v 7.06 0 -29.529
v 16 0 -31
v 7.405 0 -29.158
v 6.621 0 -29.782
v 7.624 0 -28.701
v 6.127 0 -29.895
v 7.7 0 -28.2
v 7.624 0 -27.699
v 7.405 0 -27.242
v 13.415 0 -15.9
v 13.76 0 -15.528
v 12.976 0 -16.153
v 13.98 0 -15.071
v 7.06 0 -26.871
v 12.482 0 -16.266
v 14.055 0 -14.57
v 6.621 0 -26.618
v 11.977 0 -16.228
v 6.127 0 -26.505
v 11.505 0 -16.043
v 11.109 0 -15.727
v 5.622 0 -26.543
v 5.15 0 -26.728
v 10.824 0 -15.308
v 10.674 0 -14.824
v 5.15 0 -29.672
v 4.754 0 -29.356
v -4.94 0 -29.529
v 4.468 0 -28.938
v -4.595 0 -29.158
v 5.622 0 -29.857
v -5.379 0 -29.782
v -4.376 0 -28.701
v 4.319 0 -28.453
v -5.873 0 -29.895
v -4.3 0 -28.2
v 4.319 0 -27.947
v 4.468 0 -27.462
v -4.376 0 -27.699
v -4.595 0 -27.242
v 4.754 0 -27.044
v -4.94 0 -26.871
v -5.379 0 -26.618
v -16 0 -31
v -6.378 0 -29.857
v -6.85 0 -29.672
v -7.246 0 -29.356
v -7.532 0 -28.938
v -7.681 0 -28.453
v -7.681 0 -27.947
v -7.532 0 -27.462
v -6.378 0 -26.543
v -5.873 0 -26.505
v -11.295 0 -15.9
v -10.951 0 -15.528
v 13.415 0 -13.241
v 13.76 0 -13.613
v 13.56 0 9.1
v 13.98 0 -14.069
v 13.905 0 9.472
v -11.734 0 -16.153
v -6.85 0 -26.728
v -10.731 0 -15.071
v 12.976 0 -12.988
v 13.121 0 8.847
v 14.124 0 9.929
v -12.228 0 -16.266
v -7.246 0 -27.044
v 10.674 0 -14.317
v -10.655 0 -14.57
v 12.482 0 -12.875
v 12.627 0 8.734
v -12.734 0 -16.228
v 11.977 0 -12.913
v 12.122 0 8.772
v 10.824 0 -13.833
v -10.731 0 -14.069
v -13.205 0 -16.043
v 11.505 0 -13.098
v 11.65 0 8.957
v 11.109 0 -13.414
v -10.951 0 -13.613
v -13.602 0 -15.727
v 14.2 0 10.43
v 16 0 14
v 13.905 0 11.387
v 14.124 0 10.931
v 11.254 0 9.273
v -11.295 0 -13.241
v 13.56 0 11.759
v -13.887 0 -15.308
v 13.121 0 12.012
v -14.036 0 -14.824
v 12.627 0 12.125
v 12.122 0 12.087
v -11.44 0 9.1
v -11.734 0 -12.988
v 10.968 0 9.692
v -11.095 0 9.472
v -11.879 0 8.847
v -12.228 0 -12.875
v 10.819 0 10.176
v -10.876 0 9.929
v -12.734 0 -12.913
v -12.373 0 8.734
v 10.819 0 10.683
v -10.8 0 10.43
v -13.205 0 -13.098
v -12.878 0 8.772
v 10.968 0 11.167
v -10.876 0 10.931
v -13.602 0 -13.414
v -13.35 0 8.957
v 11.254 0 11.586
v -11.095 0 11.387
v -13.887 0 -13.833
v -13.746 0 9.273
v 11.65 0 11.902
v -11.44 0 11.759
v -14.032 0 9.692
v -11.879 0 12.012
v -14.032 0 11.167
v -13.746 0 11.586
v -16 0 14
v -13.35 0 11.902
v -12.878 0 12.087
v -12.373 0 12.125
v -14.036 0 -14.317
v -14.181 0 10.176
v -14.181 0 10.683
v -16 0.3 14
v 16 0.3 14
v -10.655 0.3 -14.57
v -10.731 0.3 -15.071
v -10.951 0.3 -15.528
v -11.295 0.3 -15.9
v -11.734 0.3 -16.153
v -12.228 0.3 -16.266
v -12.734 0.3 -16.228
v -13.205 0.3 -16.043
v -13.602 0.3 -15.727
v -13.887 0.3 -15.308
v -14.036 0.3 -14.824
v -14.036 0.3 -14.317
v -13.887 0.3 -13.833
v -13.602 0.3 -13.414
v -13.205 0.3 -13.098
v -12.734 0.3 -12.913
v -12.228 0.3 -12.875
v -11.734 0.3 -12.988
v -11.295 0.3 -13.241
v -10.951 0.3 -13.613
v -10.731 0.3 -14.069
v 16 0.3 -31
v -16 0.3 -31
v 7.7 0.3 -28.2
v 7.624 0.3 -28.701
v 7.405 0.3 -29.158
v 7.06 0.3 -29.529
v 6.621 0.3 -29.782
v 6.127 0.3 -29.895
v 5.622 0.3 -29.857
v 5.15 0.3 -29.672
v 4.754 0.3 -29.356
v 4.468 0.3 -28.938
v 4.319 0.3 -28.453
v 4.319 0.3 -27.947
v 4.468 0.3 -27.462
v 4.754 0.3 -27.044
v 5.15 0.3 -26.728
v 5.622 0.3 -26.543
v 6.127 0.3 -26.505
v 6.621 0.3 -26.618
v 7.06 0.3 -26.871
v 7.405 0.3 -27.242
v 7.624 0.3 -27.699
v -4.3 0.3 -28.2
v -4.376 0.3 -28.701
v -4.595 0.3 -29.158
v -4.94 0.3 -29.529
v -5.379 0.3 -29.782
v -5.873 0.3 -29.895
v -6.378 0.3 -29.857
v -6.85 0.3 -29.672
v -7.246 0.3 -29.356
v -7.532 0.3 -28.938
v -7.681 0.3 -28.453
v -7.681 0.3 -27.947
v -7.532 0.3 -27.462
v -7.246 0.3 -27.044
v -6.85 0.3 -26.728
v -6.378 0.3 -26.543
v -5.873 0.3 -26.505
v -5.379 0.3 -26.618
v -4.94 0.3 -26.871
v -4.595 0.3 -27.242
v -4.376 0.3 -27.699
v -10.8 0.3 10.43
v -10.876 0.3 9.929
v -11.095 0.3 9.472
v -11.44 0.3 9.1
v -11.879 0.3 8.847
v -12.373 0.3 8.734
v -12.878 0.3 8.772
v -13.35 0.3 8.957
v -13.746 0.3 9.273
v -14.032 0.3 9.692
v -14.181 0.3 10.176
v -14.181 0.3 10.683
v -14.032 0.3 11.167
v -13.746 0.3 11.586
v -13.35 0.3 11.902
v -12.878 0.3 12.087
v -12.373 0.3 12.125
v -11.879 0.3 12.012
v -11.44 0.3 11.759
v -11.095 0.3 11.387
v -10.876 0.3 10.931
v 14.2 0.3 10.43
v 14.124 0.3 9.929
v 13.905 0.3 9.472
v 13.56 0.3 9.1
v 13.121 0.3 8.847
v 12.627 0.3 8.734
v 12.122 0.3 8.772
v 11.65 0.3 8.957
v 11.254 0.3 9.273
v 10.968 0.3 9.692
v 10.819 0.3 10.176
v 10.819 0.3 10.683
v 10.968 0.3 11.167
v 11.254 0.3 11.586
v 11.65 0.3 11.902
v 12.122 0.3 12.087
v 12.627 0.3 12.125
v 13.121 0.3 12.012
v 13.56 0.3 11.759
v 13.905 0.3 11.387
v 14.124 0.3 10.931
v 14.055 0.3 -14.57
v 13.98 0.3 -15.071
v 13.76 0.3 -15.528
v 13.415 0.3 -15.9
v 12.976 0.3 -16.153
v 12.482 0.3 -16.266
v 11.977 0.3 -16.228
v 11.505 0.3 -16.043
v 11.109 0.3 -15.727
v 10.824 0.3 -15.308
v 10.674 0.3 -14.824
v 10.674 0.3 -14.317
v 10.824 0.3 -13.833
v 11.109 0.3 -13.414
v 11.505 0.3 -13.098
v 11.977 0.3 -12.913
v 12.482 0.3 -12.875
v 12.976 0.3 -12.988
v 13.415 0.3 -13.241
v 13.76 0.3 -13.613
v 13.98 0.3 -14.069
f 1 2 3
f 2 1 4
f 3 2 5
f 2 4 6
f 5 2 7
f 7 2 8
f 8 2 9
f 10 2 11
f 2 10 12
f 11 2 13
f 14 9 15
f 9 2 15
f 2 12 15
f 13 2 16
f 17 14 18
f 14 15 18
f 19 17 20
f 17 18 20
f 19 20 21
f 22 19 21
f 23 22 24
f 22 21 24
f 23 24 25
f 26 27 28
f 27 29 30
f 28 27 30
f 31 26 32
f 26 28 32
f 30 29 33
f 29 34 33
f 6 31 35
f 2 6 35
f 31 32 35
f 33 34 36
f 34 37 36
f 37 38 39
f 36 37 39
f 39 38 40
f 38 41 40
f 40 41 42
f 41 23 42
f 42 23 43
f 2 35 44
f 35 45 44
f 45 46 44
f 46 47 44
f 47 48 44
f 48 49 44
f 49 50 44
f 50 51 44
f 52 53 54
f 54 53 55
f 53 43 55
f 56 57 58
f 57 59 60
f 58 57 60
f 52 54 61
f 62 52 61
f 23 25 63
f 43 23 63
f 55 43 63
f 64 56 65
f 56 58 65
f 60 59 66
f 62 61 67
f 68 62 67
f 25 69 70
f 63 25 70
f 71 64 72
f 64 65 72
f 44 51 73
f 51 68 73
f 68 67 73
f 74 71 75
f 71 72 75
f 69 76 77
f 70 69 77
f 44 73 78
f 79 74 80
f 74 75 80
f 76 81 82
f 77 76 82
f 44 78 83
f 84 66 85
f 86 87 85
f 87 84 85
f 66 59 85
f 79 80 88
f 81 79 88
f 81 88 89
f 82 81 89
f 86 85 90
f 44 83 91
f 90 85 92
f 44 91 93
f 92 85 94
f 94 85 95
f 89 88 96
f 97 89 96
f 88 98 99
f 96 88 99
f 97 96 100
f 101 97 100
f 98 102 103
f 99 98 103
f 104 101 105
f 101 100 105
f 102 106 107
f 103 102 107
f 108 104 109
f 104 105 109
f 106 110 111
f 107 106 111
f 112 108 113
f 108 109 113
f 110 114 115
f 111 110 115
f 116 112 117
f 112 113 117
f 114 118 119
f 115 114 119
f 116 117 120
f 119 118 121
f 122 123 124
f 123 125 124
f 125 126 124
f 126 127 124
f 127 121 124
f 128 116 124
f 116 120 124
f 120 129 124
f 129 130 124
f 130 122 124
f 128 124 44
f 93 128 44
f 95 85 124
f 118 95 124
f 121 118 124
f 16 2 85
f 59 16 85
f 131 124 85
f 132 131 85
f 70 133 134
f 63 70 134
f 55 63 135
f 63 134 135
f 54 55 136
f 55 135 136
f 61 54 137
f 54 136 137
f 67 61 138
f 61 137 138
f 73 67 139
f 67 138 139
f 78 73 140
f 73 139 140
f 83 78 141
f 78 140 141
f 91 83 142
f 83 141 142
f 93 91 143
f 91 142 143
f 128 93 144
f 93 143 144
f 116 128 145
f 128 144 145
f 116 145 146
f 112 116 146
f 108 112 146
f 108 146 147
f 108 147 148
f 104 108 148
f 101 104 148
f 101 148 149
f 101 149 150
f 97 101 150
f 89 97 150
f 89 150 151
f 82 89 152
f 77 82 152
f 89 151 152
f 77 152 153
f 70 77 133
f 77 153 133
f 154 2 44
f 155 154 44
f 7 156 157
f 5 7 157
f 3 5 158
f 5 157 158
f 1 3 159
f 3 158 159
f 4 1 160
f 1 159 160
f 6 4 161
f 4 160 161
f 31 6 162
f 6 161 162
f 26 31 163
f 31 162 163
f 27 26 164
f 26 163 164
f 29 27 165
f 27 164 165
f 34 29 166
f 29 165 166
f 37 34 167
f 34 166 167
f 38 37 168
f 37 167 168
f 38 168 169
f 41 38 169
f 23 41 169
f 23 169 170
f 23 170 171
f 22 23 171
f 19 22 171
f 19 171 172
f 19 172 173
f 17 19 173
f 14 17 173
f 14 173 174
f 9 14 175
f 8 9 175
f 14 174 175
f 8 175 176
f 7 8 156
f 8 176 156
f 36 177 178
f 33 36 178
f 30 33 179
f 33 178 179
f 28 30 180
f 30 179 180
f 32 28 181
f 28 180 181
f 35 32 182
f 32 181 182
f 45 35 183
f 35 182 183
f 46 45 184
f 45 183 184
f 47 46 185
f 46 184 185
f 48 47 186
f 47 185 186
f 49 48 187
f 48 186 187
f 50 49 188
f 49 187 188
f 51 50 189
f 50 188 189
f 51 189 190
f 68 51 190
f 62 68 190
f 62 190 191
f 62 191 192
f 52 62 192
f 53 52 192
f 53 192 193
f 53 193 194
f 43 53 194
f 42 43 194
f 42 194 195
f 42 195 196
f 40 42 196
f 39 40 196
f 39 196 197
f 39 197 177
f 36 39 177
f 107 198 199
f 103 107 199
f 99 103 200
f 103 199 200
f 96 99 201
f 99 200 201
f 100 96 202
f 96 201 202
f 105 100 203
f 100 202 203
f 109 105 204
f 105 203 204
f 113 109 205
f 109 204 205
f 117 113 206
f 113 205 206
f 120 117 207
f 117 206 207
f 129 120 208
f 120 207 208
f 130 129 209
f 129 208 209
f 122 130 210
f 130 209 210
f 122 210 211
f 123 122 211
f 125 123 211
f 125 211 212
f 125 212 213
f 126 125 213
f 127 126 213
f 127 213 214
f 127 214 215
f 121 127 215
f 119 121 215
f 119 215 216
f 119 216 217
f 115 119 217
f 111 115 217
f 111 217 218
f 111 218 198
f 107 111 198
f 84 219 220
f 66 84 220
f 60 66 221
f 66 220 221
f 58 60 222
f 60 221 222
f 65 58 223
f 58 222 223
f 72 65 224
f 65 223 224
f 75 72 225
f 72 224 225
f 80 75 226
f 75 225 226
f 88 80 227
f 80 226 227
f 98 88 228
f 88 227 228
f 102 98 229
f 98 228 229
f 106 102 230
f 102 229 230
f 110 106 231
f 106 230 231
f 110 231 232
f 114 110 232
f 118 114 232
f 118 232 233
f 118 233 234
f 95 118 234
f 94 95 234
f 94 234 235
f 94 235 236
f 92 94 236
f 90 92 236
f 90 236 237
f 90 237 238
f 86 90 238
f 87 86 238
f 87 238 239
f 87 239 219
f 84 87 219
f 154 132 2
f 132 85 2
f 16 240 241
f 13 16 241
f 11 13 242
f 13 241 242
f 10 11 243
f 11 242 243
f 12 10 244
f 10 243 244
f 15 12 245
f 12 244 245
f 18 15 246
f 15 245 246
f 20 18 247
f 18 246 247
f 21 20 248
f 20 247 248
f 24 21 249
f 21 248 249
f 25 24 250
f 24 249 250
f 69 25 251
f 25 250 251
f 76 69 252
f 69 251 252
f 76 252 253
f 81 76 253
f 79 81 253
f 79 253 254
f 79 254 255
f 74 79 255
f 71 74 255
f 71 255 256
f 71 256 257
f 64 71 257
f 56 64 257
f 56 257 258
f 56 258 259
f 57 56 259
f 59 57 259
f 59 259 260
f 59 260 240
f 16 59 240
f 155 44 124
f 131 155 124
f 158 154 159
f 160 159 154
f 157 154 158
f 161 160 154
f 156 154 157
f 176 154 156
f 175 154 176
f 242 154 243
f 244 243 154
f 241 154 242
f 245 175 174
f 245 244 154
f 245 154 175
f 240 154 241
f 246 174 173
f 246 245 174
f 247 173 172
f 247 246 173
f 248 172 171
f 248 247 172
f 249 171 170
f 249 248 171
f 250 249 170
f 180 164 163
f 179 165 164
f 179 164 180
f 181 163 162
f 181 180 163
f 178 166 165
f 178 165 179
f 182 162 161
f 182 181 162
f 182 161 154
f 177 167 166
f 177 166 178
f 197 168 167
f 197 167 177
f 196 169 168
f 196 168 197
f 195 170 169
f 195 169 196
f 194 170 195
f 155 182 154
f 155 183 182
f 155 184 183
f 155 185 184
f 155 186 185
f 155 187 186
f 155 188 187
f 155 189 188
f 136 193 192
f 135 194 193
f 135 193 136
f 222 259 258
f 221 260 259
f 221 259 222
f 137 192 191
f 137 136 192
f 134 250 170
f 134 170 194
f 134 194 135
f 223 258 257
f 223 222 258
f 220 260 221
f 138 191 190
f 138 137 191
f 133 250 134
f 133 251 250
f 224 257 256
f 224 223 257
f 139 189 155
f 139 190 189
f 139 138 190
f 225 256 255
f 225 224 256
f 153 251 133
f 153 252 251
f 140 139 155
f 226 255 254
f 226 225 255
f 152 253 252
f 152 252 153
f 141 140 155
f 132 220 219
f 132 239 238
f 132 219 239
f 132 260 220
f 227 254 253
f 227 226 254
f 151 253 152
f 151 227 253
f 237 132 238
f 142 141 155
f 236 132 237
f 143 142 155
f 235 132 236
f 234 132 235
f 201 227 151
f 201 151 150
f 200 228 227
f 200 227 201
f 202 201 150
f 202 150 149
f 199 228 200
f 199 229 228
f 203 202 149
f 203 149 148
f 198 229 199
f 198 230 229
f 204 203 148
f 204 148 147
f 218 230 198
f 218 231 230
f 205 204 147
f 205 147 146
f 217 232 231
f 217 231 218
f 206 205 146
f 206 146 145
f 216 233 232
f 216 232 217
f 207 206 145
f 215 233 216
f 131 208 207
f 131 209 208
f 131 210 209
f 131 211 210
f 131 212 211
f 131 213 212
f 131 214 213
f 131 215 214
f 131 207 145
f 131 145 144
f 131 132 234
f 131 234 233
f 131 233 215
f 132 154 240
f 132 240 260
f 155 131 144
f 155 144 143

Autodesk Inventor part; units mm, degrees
ref_plane "YZ Plane" through (0, 0, 0) normal (1, 0, 0) x (0, 1, 0)
ref_plane "XZ Plane" through (0, 0, 0) normal (0, 1, 0) x (-1, 0, 0)
ref_plane "XY Plane" through (0, 0, 0) normal (0, 0, 1) x (1, 0, 0)
sketch "スケッチ1" plane through (0, 0, 0) normal (0, 1, 0) x (-1, 0, 0)
  line L0 (16, -31) -> (16, 14)
  line L1 (16, 14) -> (-16, 14)
  line L2 (-16, 14) -> (-16, -31)
  line L3 (-16, -31) -> (16, -31)
  line L4 (0, 0) -> (0, -32.6995) construction
  point P0 (0, 14)
  dimension "d0" = 45
  dimension "d1" = 32
  dimension "d2" = 14
extrude "押し出し1" add sketch "スケッチ1" along normal blind 0.3
sketch "スケッチ4" plane through (0, 0.3, 0) normal (0, 1, 0) x (1, 0, 0)
  line L0 (0, 0) -> (-18.7084, 0) construction
  circle A0 centre (-6, 28.2) radius 1.7
  circle A1 centre (6, 28.2) radius 1.7
  line L1 (0, 0) -> (0, 29.6633) construction
  line L2 (16, 31) -> (-16, 31) projected
  point P0 (0, 31)
  dimension "d35" = 3.4
  dimension "d36" = 3.4
  dimension "d37" = 6
  dimension "d38" = 2.8
extrude "押し出し3" cut sketch "スケッチ4" against normal through all
sketch "スケッチ7" plane through (0, 0.3, 0) normal (0, 1, 0) x (1, 0, 0)
  circle A0 centre (-12.5, -10.4296) radius 1.7
  circle A1 centre (12.5, -10.4296) radius 1.7
  circle A2 centre (12.3554, 14.5704) radius 1.7
  circle A3 centre (-12.3554, 14.5704) radius 1.7
  line L0 (0, 0) -> (0, 34.4459) construction
  dimension "d47" = 3.4
  dimension "d48" = 3.4
  dimension "d49" = 3.4
  dimension "d50" = 3.4
  dimension "d51" = 25
  dimension "d52" = 25
extrude "押し出し6" cut sketch "スケッチ7" against normal through all
properties part number "B_holder_sub_muti-holes" material "ステンレス鋼 440C"
